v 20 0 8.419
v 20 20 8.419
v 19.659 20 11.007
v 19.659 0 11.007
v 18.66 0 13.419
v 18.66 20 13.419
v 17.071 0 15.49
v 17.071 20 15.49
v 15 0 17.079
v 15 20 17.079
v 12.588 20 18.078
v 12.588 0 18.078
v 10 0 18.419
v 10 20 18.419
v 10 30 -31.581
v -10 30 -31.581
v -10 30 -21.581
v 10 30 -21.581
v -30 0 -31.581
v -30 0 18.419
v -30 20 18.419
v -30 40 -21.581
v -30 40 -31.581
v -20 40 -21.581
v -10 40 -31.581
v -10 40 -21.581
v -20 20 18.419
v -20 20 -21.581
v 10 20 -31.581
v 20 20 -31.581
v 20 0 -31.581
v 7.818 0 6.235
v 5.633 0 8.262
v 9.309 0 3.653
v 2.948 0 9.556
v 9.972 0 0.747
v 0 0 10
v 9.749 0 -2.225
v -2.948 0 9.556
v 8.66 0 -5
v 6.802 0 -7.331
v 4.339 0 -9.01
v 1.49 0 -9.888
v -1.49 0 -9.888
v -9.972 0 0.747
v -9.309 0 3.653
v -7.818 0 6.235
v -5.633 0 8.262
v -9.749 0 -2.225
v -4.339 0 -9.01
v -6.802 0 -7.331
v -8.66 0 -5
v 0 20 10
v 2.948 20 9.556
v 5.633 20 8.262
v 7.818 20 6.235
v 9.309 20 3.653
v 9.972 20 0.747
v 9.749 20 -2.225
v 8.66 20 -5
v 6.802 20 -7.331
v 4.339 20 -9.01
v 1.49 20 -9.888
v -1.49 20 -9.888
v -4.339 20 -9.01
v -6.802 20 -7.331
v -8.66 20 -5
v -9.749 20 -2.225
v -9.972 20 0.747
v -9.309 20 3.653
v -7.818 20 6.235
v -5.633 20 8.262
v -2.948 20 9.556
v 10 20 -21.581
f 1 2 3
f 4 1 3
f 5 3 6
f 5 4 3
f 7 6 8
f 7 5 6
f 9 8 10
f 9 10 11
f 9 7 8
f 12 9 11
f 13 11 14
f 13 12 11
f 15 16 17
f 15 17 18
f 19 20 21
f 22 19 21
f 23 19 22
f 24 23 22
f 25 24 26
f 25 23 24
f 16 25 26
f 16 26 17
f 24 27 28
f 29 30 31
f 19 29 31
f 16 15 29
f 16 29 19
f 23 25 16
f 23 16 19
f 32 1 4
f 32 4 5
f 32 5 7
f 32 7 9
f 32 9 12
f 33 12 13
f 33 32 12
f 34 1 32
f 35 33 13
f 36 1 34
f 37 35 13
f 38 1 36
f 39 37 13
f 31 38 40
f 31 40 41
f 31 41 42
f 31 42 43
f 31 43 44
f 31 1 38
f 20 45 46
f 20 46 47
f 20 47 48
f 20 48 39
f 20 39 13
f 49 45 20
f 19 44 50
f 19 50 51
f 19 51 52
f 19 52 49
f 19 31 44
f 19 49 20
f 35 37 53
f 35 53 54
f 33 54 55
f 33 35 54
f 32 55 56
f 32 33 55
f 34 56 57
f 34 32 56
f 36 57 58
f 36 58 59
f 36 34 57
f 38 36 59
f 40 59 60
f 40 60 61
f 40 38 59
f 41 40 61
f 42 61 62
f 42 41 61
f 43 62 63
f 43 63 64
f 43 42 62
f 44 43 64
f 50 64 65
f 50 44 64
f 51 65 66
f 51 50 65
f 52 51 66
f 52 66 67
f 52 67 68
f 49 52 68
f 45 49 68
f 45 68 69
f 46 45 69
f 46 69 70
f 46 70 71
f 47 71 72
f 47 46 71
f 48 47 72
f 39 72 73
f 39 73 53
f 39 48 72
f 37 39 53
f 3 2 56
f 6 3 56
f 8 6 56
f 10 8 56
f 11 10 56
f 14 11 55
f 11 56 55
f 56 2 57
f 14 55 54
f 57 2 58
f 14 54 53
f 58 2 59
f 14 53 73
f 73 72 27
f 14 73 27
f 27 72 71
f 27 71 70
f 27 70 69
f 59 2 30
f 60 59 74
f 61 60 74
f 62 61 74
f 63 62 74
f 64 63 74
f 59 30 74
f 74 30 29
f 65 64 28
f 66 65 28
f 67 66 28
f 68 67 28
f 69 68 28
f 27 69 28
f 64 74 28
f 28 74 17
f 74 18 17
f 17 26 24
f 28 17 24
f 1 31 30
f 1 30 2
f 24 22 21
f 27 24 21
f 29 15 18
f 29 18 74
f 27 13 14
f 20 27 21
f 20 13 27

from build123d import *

# Parameters (mm, degrees)
SKETCH1_R           = 10
BOSS_EXTRUDE1_DEPTH = 20
BOSS_EXTRUDE2_DEPTH = 10
BOSS_EXTRUDE3_DEPTH = 10


with BuildPart() as part:
    # Sketch1 → Boss-Extrude1 (new body)
    with BuildSketch(Plane(origin=(0, 0, 0), x_dir=(1, 0, 0), z_dir=(0, 1, 0))):
        with BuildLine():
            Line((-30, 31.581015912), (20, 31.581015912))
            Line((20, 31.581015912), (20, -8.418984088))
            ThreePointArc((20, -8.418984088), (17.071067812, -15.4900519), (10, -18.418984088))
            Line((10, -18.418984088), (-30, -18.418984088))
            Line((-30, -18.418984088), (-30, 31.581015912))
        make_face()
        with Locations(Location((0, 0, 0), (0, 0, 270))):
            Circle(SKETCH1_R, mode=Mode.SUBTRACT)
    extrude(amount=BOSS_EXTRUDE1_DEPTH)

    # Sketch2 → Boss-Extrude2 (add)
    with BuildSketch(Plane.ZY.offset(30)):
        Polygon((18.418984088, 20), (-21.581015912, 20), (-21.581015912, 40), align=None)
    extrude(amount=-BOSS_EXTRUDE2_DEPTH)

    # Sketch3 → Boss-Extrude3 (add)
    with BuildSketch(Plane(origin=(0, 0, -31.581015912), x_dir=(-1, 0, 0), z_dir=(0, 0, -1))):
        Polygon((30, 20), (30, 40), (10, 40), (10, 30), (-10, 30), (-10, 20), align=None)
    extrude(amount=-BOSS_EXTRUDE3_DEPTH)


solid = part.part
